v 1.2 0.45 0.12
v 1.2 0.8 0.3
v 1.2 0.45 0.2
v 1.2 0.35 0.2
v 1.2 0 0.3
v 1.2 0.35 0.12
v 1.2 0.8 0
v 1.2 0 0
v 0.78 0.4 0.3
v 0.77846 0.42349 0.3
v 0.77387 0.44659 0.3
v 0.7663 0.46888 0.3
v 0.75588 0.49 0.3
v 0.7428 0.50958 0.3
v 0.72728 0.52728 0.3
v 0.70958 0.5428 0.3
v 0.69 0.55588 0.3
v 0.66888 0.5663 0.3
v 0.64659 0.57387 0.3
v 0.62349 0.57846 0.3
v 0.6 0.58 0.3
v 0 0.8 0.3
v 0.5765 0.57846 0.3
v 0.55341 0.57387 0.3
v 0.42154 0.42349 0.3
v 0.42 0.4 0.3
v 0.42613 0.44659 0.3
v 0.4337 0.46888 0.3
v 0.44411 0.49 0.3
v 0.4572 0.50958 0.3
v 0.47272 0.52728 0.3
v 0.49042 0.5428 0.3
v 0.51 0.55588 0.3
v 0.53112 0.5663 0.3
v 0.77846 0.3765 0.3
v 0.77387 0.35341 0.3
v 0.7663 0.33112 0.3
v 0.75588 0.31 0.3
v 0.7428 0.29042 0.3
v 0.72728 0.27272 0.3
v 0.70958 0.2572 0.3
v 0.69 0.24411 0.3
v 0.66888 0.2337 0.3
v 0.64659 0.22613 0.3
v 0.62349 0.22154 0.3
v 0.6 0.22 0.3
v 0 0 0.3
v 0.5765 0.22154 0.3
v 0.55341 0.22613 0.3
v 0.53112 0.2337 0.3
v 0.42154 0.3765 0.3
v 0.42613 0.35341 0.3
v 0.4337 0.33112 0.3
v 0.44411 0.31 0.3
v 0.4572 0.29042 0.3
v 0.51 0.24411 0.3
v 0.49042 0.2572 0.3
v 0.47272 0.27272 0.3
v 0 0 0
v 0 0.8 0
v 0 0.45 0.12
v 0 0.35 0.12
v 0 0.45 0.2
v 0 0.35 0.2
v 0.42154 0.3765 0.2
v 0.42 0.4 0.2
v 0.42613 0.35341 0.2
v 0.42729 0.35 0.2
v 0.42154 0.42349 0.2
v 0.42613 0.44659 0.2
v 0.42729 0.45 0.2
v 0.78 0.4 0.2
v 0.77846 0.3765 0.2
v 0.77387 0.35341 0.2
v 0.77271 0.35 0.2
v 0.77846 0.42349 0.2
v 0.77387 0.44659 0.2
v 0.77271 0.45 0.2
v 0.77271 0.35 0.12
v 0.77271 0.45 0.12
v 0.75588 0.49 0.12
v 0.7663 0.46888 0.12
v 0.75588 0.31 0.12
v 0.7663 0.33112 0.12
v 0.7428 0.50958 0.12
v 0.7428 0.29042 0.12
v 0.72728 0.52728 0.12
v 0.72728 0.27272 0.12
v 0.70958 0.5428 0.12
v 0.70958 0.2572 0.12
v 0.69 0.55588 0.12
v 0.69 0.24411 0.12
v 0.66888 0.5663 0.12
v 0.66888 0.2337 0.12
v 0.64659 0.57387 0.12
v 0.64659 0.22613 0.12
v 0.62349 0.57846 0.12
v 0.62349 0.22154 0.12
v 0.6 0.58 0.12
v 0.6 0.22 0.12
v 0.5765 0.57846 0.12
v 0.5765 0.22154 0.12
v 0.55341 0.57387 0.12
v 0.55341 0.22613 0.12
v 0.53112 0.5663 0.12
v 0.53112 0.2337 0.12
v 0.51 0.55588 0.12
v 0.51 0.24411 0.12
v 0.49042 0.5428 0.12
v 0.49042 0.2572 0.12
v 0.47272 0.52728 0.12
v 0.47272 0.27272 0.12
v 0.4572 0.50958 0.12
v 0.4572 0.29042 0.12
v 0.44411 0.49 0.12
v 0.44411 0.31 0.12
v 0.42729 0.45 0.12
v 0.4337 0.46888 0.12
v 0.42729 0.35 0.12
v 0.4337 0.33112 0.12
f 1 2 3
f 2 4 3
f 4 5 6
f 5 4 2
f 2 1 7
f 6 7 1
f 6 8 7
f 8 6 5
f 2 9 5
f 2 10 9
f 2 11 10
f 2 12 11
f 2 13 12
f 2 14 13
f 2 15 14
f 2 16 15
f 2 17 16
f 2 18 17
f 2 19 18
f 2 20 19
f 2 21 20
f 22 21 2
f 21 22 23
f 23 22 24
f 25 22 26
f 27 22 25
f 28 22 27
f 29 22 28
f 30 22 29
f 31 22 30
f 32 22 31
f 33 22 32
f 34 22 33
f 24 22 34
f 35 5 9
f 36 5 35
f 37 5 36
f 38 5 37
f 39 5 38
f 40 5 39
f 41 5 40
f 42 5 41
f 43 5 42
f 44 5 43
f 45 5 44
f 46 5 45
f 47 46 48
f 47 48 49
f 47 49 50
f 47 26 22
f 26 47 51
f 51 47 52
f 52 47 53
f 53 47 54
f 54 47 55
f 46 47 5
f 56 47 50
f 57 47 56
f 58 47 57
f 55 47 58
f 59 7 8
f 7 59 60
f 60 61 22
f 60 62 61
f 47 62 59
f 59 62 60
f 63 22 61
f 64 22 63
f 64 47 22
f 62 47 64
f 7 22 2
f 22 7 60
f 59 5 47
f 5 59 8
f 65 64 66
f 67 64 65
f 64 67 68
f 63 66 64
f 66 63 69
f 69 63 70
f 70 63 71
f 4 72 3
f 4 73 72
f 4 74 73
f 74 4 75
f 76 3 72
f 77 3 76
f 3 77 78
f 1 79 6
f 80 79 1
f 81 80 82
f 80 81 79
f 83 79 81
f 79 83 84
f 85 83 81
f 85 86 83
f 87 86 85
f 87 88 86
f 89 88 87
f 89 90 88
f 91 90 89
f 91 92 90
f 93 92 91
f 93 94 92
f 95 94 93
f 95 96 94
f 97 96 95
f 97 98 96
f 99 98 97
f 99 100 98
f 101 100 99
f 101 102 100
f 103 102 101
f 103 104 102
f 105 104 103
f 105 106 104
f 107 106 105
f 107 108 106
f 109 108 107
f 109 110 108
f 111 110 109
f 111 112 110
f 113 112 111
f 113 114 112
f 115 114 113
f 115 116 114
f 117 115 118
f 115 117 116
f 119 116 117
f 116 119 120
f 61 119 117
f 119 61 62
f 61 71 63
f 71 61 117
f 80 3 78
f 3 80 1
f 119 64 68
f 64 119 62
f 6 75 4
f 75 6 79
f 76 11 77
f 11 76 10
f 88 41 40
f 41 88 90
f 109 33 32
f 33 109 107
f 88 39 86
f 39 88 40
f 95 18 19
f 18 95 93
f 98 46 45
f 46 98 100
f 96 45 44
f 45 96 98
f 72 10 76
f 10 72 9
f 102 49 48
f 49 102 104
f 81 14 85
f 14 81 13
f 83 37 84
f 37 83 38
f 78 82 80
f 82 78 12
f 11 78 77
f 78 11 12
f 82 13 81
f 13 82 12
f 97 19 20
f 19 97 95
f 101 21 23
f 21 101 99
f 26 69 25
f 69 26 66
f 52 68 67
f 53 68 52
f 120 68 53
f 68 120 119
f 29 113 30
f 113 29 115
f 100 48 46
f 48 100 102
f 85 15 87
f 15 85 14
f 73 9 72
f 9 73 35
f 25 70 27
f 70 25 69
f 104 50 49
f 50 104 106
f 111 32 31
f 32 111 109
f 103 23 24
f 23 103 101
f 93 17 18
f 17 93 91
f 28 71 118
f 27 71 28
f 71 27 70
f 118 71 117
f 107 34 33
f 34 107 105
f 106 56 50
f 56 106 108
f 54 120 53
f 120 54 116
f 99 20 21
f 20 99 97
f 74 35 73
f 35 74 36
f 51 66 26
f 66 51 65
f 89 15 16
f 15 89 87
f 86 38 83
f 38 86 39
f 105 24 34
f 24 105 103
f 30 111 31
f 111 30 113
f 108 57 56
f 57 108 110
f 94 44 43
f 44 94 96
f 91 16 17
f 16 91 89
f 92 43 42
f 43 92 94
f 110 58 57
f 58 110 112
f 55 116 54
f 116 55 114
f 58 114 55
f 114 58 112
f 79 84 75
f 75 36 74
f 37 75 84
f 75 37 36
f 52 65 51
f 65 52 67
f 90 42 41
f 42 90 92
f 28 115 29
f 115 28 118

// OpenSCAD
// FR : géométrie illustrative, unités mm, fonction non validée.
// EN: illustrative geometry, mm units, unvalidated function.
// ES: geometría ilustrativa, unidades mm, función no validada.
scale([1, 1, 1]) {
difference() {
  cube([1.2, 0.8, 0.3]);
  translate([-0.01, 0.35, 0.12]) cube([1.22, 0.1, 0.08]);
  translate([0.6, 0.4, 0.12]) cylinder(h=0.19, r=0.18, $fn=48);
}
}
